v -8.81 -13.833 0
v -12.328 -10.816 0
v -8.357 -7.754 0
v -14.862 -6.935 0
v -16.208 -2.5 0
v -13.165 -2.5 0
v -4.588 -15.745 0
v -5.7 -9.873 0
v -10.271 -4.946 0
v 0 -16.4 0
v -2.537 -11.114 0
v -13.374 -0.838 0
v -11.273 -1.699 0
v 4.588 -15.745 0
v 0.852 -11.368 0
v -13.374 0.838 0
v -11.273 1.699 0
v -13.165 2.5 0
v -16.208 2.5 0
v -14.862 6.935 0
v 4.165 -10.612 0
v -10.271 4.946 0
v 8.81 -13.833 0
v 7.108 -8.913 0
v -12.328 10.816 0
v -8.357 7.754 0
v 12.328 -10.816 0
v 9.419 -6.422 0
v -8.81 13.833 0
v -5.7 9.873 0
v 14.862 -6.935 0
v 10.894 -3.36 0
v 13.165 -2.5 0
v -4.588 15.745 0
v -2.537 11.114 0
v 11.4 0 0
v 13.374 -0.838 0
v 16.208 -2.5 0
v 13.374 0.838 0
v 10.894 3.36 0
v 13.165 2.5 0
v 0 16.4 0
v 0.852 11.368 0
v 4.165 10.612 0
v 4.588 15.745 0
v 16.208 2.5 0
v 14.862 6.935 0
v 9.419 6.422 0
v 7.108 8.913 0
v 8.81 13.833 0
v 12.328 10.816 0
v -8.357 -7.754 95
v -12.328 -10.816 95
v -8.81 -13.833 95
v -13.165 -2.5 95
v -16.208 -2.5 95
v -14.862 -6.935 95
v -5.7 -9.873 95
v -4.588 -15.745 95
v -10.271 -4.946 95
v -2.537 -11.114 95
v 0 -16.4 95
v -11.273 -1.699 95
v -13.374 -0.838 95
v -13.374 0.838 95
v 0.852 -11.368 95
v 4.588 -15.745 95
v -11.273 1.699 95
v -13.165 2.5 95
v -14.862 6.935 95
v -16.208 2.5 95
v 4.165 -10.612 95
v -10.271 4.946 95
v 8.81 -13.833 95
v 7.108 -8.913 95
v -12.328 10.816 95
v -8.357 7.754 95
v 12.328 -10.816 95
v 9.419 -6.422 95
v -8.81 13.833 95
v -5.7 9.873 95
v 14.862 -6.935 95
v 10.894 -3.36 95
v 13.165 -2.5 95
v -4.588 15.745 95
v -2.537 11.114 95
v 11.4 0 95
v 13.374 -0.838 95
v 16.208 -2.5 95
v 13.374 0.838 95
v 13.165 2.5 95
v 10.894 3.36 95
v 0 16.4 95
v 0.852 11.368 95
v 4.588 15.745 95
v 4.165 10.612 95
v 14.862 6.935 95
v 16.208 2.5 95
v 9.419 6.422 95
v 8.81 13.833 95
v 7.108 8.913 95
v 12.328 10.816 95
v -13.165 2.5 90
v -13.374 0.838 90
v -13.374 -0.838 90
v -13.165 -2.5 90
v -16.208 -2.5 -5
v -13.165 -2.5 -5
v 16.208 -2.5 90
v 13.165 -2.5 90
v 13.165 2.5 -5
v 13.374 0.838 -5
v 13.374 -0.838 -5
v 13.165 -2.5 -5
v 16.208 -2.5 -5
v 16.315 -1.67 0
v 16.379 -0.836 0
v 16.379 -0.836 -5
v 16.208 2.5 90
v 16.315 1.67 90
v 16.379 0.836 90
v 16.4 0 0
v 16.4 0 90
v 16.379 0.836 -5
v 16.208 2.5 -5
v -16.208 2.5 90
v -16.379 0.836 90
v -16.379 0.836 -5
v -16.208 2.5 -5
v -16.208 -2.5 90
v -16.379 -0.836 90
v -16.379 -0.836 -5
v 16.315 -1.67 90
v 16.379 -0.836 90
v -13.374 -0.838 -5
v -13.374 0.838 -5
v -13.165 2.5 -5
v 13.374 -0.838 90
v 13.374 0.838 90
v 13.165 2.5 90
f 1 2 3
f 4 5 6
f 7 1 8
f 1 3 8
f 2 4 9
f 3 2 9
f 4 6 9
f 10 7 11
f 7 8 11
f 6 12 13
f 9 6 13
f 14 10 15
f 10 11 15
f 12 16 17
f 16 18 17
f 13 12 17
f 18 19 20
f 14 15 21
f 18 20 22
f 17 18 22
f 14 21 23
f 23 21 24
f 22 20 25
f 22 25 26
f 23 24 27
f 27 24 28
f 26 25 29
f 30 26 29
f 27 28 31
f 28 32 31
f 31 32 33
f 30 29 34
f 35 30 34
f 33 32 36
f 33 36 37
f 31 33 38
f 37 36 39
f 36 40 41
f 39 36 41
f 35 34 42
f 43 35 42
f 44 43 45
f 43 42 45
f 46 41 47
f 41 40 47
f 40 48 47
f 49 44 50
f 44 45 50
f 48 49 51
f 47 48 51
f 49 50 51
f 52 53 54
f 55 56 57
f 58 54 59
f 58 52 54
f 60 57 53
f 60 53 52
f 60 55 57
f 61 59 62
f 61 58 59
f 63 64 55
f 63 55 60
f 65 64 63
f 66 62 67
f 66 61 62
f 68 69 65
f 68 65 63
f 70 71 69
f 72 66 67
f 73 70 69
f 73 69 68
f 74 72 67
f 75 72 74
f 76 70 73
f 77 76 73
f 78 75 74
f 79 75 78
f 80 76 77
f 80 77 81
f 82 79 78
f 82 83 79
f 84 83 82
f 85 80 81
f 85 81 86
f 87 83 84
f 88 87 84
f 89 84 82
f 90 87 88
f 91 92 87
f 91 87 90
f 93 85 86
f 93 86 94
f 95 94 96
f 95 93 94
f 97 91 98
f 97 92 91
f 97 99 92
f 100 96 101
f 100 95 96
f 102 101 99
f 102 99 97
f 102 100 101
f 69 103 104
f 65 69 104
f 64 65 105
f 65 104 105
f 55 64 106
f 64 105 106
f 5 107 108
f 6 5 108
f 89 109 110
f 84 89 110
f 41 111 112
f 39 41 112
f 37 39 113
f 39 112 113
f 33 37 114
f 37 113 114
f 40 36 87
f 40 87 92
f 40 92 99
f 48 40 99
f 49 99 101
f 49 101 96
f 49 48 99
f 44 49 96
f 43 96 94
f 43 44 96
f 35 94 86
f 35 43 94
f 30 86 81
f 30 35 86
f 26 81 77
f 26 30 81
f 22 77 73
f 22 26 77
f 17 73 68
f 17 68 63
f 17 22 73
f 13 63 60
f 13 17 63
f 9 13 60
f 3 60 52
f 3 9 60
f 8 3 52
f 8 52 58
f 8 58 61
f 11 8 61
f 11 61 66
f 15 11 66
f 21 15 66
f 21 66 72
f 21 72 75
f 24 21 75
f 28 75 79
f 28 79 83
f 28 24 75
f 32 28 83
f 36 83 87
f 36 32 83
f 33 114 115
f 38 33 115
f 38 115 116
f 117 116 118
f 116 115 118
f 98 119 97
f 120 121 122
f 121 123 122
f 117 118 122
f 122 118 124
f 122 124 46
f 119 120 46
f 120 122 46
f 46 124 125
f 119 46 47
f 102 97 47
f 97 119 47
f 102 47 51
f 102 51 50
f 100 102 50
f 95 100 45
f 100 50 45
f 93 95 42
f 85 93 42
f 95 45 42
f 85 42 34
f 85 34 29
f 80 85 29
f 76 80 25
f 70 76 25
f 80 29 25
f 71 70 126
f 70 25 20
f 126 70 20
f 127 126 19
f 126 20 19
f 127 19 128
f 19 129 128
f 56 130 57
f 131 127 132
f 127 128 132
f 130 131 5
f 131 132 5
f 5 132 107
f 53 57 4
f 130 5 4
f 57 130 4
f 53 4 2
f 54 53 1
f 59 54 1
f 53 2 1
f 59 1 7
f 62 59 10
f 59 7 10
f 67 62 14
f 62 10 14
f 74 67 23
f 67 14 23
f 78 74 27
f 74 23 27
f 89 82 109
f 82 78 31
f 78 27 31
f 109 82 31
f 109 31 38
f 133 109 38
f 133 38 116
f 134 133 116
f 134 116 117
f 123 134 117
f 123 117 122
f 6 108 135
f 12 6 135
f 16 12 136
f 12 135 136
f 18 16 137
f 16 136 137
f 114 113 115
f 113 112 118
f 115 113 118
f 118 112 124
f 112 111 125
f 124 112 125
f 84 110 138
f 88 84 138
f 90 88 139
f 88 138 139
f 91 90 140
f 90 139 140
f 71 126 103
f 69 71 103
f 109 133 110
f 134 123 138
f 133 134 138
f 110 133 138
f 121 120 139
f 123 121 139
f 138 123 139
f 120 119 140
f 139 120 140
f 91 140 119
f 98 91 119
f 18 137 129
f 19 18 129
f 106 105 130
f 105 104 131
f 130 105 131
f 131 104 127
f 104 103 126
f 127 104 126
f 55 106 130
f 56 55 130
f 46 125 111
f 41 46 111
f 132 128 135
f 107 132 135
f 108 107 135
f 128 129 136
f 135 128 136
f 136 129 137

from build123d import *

# Parameters (mm, degrees)
SKETCH1_R           = 16.4
SKETCH1_R_2         = 11.4
BOSS_EXTRUDE1_DEPTH = 95
BOSS_EXTRUDE2_START = 5
BOSS_EXTRUDE2_DEPTH = 5
CUT_EXTRUDE1_START  = -5
CUT_EXTRUDE1_DEPTH  = 5


with BuildPart() as part:
    # Sketch1 → Boss-Extrude1 (new body)
    with BuildSketch(Plane.XY):
        Circle(SKETCH1_R)
        Circle(SKETCH1_R_2, mode=Mode.SUBTRACT)
    extrude(amount=BOSS_EXTRUDE1_DEPTH)

    # Sketch3 → Boss-Extrude2 (add)
    with BuildSketch(Plane(origin=(0, 0, 0), x_dir=(-1, 0, 0), z_dir=(0, 0, -1)).offset(BOSS_EXTRUDE2_START)):
        with BuildLine():
            Line((13.164725595, 2.5), (16.208331191, 2.5))
            ThreePointArc((16.208331191, 2.5), (16.4, 0), (16.208331191, -2.5))
            Line((16.208331191, -2.5), (13.164725595, -2.5))
            ThreePointArc((13.164725595, -2.5), (13.4, 0), (13.164725595, 2.5))
        make_face()
        with BuildLine():
            Line((-16.208331191, 2.5), (-13.164725595, 2.5))
            ThreePointArc((-13.164725595, 2.5), (-13.4, 0), (-13.164725595, -2.5))
            Line((-13.164725595, -2.5), (-16.208331191, -2.5))
            ThreePointArc((-16.208331191, -2.5), (-16.4, 0), (-16.208331191, 2.5))
        make_face()
    extrude(amount=-BOSS_EXTRUDE2_DEPTH)

    # Sketch4 → Cut-Extrude1 (cut)
    with BuildSketch(Plane.XY.offset(95).offset(CUT_EXTRUDE1_START)):
        with BuildLine():
            Line((13.164725595, 2.5), (16.208331191, 2.5))
            ThreePointArc((16.208331191, 2.5), (16.4, 0), (16.208331191, -2.5))
            Line((16.208331191, -2.5), (13.164725595, -2.5))
            ThreePointArc((13.164725595, -2.5), (13.4, 0), (13.164725595, 2.5))
        make_face()
        with BuildLine():
            Line((-16.208331191, 2.5), (-13.164725595, 2.5))
            ThreePointArc((-13.164725595, 2.5), (-13.4, 0), (-13.164725595, -2.5))
            Line((-13.164725595, -2.5), (-16.208331191, -2.5))
            ThreePointArc((-16.208331191, -2.5), (-16.4, 0), (-16.208331191, 2.5))
        make_face()
    extrude(amount=CUT_EXTRUDE1_DEPTH, mode=Mode.SUBTRACT)


solid = part.part
